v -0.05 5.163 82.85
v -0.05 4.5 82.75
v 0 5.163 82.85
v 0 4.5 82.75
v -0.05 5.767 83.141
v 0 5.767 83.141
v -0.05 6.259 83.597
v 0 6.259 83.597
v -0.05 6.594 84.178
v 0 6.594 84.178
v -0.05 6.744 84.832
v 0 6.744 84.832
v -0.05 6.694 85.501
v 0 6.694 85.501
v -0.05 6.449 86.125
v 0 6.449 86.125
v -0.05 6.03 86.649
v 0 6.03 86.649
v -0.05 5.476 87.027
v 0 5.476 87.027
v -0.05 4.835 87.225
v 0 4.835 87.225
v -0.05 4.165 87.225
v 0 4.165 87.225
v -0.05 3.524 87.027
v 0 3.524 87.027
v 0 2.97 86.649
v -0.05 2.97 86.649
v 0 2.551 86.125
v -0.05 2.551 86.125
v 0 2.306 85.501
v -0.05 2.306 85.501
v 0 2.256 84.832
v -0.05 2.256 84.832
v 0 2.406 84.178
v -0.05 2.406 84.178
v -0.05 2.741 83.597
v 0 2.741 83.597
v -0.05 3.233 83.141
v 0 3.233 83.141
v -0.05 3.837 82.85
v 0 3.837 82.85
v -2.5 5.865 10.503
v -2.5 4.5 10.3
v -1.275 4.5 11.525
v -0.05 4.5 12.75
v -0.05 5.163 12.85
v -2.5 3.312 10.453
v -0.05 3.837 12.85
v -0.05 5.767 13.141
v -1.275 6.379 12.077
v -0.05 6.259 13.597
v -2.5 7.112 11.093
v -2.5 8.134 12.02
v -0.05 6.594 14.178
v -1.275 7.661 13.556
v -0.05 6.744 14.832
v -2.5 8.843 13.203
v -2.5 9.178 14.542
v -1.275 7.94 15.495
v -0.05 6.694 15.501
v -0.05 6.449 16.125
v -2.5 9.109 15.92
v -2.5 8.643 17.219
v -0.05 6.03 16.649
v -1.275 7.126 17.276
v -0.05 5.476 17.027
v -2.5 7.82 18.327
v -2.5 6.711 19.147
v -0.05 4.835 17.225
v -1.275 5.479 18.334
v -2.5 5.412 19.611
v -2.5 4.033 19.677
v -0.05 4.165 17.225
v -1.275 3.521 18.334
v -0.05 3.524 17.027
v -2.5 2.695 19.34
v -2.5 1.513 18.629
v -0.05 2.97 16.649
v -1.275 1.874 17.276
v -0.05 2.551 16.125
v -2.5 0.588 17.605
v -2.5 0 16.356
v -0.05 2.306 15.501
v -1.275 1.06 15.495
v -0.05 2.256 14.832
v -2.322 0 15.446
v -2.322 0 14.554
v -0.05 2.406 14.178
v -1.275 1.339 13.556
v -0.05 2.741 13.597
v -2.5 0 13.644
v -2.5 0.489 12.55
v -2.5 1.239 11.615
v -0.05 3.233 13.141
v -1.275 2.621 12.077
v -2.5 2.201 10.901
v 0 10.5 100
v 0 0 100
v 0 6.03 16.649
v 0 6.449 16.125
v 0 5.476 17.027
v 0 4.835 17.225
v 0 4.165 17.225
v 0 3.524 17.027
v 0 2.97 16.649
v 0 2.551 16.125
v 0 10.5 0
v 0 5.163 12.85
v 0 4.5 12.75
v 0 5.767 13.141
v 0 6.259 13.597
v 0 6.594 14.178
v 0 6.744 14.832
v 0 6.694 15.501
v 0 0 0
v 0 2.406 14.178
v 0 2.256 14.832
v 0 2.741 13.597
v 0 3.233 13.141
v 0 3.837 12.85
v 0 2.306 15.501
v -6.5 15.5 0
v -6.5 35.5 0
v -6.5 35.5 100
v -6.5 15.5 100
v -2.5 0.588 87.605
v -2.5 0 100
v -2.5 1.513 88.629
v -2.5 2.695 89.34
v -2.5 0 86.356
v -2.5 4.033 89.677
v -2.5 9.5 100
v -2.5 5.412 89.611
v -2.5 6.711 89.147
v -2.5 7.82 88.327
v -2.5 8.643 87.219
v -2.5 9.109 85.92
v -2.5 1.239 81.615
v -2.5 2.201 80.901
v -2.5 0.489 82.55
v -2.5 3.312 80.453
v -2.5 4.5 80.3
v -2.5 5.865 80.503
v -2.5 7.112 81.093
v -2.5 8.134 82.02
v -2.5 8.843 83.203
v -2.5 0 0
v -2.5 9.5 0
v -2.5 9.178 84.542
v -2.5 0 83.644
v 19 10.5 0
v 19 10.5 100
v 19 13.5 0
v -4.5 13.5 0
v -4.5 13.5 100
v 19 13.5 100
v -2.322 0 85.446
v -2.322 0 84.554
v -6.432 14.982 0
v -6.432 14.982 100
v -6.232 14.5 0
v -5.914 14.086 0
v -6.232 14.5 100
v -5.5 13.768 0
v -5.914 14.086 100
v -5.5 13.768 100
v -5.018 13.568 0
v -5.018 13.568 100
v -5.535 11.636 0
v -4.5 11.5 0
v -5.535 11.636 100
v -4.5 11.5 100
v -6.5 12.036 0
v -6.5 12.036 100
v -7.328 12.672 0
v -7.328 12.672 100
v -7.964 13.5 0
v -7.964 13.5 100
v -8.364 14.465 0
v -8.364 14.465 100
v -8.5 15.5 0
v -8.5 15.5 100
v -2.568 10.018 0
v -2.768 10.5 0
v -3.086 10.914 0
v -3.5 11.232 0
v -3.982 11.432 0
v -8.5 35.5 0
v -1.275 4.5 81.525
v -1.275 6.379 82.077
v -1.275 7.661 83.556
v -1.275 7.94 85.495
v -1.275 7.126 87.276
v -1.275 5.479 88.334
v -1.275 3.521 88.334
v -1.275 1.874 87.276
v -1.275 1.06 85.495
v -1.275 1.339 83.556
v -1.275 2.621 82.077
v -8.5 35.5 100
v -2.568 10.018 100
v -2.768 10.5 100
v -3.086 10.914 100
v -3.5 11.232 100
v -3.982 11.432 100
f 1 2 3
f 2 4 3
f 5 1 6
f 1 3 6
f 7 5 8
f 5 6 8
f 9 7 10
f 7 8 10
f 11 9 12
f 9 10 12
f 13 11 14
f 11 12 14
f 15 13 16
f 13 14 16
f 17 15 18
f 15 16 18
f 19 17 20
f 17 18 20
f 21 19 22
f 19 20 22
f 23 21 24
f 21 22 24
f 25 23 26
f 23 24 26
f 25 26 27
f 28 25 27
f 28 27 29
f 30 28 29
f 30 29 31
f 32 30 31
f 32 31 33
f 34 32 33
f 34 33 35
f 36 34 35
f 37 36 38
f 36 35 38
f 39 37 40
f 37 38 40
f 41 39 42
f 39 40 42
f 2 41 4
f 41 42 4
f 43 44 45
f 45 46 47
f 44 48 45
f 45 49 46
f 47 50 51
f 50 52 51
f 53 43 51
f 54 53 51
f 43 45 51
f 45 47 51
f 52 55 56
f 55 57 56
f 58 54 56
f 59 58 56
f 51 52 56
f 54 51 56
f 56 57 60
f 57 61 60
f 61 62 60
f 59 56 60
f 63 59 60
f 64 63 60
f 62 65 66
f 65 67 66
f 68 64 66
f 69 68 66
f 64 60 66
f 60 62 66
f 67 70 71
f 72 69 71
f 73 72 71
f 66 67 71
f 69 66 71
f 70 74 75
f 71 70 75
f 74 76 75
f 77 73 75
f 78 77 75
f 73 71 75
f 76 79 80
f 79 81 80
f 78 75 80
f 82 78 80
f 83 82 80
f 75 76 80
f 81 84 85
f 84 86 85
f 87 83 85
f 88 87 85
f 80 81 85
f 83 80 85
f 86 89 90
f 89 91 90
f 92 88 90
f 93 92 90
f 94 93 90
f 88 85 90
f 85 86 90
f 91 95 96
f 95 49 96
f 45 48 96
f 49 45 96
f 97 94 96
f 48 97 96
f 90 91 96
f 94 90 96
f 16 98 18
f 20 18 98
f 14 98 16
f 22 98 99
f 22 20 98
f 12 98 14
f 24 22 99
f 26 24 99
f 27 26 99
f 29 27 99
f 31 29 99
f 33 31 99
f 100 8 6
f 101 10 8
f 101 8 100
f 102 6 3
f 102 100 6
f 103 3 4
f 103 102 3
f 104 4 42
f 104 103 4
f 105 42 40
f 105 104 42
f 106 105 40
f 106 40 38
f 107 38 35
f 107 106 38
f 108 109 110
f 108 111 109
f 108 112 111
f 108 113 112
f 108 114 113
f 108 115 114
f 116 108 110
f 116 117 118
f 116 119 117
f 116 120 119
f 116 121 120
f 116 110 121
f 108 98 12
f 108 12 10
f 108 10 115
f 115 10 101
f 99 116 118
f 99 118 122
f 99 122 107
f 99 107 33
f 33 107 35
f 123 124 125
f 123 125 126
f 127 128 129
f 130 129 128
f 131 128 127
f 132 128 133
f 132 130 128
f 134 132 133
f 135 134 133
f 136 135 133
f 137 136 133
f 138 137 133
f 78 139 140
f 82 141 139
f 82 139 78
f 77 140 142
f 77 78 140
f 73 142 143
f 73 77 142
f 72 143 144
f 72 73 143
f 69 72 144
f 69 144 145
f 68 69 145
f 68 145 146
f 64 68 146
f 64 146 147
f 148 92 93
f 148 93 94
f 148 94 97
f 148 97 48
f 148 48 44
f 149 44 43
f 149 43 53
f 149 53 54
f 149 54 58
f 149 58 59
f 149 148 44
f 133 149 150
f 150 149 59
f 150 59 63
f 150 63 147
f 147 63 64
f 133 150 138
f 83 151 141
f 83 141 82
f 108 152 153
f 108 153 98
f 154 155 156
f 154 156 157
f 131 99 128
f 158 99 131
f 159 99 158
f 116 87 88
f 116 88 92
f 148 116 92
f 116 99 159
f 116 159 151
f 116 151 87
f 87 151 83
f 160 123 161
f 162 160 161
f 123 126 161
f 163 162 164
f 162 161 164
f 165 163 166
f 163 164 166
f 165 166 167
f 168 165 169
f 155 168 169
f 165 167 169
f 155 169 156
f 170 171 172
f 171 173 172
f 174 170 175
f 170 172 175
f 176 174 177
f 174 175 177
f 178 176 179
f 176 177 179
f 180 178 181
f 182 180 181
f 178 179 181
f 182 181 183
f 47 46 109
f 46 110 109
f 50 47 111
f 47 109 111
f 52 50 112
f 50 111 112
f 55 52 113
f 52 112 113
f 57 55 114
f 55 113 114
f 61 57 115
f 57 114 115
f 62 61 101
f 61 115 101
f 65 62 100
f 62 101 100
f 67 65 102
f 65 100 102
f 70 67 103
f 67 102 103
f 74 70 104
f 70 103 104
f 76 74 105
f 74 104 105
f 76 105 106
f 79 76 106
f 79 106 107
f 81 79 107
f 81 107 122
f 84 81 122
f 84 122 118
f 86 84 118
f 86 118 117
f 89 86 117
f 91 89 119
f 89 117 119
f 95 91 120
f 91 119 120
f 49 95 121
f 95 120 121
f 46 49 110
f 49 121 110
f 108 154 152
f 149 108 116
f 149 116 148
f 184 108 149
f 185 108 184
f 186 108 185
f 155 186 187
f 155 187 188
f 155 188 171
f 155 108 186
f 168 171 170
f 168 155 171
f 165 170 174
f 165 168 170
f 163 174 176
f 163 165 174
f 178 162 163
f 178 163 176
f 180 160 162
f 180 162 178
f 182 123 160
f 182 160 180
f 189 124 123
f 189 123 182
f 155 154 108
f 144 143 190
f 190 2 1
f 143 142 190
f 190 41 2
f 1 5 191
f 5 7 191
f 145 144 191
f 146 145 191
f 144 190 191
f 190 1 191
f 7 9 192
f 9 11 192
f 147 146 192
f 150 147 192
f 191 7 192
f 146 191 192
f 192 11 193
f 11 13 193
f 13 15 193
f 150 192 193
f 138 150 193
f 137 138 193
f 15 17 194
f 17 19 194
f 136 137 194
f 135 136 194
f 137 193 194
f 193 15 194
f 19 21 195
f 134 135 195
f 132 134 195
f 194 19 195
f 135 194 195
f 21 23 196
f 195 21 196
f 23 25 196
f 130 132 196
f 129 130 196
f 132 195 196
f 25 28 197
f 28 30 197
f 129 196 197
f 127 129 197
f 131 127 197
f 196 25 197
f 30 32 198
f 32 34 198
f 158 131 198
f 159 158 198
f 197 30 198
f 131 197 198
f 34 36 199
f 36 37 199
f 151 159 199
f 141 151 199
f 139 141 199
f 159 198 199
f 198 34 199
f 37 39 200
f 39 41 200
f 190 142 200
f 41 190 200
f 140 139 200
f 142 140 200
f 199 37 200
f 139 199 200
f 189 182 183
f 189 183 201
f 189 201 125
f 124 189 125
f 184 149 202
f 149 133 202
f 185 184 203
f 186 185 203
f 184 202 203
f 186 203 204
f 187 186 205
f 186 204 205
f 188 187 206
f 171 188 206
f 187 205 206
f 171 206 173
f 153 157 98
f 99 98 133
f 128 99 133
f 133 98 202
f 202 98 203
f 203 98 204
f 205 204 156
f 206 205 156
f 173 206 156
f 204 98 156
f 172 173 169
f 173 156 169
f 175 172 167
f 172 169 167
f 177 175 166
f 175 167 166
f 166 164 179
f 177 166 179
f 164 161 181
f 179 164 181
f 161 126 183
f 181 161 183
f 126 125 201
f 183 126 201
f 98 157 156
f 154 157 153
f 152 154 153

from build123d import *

# Parameters (mm, degrees)
ESTRUSIONE_ESTRUSIONE1_DEPTH           = 100
RACCORDO1_R                            = 2
RACCORDO2_R                            = 4
FORO_SVASATO_PER_VITE_M4_1_D           = 4.5
FORO_SVASATO_PER_VITE_M4_1_DEPTH       = 188
FORO_SVASATO_PER_VITE_M4_1_CSINK_D     = 9.4
FORO_SVASATO_PER_VITE_M4_1_CSINK_ANGLE = 90
FORO_SVASATO_PER_VITE_M4_1_TIP         = 1.351936393


with BuildPart() as part:
    # Schizzo1 → Estrusione-Estrusione1 (new body)
    with BuildSketch(Plane.XY):
        Polygon((0, 0), (-2.5, 0), (-2.5, 11.5), (-8.5, 11.5), (-8.5, 35.5), (-6.5, 35.5), (-6.5, 13.5), (19, 13.5), (19, 10.5), (0, 10.5), align=None)
    extrude(amount=ESTRUSIONE_ESTRUSIONE1_DEPTH)

    # Raccordo1
    raccordo1_edges = [part.edges().sort_by_distance(p)[0] for p in [
        (-2.5, 11.5, 50),
        (-6.5, 13.5, 50),
    ]]
    fillet(raccordo1_edges, radius=RACCORDO1_R)

    # Raccordo2
    raccordo2_edges = [part.edges().sort_by_distance(p)[0] for p in [
        (-8.5, 11.5, 50),
    ]]
    fillet(raccordo2_edges, radius=RACCORDO2_R - 0.0001)  # a hair under: the kernel refuses the full size

    # Foro svasato per Vite M4-1
    with Locations(Plane.ZY.offset(2.5)):
        with Locations((85, 4.5), (15, 4.5)):
            CounterSinkHole(FORO_SVASATO_PER_VITE_M4_1_D / 2, FORO_SVASATO_PER_VITE_M4_1_CSINK_D / 2, depth=FORO_SVASATO_PER_VITE_M4_1_DEPTH, counter_sink_angle=FORO_SVASATO_PER_VITE_M4_1_CSINK_ANGLE)
            with Locations((0, 0, -(FORO_SVASATO_PER_VITE_M4_1_DEPTH + FORO_SVASATO_PER_VITE_M4_1_TIP / 2))):  # 118° drill point
                Cone(0, FORO_SVASATO_PER_VITE_M4_1_D / 2, FORO_SVASATO_PER_VITE_M4_1_TIP, mode=Mode.SUBTRACT)


solid = part.part
